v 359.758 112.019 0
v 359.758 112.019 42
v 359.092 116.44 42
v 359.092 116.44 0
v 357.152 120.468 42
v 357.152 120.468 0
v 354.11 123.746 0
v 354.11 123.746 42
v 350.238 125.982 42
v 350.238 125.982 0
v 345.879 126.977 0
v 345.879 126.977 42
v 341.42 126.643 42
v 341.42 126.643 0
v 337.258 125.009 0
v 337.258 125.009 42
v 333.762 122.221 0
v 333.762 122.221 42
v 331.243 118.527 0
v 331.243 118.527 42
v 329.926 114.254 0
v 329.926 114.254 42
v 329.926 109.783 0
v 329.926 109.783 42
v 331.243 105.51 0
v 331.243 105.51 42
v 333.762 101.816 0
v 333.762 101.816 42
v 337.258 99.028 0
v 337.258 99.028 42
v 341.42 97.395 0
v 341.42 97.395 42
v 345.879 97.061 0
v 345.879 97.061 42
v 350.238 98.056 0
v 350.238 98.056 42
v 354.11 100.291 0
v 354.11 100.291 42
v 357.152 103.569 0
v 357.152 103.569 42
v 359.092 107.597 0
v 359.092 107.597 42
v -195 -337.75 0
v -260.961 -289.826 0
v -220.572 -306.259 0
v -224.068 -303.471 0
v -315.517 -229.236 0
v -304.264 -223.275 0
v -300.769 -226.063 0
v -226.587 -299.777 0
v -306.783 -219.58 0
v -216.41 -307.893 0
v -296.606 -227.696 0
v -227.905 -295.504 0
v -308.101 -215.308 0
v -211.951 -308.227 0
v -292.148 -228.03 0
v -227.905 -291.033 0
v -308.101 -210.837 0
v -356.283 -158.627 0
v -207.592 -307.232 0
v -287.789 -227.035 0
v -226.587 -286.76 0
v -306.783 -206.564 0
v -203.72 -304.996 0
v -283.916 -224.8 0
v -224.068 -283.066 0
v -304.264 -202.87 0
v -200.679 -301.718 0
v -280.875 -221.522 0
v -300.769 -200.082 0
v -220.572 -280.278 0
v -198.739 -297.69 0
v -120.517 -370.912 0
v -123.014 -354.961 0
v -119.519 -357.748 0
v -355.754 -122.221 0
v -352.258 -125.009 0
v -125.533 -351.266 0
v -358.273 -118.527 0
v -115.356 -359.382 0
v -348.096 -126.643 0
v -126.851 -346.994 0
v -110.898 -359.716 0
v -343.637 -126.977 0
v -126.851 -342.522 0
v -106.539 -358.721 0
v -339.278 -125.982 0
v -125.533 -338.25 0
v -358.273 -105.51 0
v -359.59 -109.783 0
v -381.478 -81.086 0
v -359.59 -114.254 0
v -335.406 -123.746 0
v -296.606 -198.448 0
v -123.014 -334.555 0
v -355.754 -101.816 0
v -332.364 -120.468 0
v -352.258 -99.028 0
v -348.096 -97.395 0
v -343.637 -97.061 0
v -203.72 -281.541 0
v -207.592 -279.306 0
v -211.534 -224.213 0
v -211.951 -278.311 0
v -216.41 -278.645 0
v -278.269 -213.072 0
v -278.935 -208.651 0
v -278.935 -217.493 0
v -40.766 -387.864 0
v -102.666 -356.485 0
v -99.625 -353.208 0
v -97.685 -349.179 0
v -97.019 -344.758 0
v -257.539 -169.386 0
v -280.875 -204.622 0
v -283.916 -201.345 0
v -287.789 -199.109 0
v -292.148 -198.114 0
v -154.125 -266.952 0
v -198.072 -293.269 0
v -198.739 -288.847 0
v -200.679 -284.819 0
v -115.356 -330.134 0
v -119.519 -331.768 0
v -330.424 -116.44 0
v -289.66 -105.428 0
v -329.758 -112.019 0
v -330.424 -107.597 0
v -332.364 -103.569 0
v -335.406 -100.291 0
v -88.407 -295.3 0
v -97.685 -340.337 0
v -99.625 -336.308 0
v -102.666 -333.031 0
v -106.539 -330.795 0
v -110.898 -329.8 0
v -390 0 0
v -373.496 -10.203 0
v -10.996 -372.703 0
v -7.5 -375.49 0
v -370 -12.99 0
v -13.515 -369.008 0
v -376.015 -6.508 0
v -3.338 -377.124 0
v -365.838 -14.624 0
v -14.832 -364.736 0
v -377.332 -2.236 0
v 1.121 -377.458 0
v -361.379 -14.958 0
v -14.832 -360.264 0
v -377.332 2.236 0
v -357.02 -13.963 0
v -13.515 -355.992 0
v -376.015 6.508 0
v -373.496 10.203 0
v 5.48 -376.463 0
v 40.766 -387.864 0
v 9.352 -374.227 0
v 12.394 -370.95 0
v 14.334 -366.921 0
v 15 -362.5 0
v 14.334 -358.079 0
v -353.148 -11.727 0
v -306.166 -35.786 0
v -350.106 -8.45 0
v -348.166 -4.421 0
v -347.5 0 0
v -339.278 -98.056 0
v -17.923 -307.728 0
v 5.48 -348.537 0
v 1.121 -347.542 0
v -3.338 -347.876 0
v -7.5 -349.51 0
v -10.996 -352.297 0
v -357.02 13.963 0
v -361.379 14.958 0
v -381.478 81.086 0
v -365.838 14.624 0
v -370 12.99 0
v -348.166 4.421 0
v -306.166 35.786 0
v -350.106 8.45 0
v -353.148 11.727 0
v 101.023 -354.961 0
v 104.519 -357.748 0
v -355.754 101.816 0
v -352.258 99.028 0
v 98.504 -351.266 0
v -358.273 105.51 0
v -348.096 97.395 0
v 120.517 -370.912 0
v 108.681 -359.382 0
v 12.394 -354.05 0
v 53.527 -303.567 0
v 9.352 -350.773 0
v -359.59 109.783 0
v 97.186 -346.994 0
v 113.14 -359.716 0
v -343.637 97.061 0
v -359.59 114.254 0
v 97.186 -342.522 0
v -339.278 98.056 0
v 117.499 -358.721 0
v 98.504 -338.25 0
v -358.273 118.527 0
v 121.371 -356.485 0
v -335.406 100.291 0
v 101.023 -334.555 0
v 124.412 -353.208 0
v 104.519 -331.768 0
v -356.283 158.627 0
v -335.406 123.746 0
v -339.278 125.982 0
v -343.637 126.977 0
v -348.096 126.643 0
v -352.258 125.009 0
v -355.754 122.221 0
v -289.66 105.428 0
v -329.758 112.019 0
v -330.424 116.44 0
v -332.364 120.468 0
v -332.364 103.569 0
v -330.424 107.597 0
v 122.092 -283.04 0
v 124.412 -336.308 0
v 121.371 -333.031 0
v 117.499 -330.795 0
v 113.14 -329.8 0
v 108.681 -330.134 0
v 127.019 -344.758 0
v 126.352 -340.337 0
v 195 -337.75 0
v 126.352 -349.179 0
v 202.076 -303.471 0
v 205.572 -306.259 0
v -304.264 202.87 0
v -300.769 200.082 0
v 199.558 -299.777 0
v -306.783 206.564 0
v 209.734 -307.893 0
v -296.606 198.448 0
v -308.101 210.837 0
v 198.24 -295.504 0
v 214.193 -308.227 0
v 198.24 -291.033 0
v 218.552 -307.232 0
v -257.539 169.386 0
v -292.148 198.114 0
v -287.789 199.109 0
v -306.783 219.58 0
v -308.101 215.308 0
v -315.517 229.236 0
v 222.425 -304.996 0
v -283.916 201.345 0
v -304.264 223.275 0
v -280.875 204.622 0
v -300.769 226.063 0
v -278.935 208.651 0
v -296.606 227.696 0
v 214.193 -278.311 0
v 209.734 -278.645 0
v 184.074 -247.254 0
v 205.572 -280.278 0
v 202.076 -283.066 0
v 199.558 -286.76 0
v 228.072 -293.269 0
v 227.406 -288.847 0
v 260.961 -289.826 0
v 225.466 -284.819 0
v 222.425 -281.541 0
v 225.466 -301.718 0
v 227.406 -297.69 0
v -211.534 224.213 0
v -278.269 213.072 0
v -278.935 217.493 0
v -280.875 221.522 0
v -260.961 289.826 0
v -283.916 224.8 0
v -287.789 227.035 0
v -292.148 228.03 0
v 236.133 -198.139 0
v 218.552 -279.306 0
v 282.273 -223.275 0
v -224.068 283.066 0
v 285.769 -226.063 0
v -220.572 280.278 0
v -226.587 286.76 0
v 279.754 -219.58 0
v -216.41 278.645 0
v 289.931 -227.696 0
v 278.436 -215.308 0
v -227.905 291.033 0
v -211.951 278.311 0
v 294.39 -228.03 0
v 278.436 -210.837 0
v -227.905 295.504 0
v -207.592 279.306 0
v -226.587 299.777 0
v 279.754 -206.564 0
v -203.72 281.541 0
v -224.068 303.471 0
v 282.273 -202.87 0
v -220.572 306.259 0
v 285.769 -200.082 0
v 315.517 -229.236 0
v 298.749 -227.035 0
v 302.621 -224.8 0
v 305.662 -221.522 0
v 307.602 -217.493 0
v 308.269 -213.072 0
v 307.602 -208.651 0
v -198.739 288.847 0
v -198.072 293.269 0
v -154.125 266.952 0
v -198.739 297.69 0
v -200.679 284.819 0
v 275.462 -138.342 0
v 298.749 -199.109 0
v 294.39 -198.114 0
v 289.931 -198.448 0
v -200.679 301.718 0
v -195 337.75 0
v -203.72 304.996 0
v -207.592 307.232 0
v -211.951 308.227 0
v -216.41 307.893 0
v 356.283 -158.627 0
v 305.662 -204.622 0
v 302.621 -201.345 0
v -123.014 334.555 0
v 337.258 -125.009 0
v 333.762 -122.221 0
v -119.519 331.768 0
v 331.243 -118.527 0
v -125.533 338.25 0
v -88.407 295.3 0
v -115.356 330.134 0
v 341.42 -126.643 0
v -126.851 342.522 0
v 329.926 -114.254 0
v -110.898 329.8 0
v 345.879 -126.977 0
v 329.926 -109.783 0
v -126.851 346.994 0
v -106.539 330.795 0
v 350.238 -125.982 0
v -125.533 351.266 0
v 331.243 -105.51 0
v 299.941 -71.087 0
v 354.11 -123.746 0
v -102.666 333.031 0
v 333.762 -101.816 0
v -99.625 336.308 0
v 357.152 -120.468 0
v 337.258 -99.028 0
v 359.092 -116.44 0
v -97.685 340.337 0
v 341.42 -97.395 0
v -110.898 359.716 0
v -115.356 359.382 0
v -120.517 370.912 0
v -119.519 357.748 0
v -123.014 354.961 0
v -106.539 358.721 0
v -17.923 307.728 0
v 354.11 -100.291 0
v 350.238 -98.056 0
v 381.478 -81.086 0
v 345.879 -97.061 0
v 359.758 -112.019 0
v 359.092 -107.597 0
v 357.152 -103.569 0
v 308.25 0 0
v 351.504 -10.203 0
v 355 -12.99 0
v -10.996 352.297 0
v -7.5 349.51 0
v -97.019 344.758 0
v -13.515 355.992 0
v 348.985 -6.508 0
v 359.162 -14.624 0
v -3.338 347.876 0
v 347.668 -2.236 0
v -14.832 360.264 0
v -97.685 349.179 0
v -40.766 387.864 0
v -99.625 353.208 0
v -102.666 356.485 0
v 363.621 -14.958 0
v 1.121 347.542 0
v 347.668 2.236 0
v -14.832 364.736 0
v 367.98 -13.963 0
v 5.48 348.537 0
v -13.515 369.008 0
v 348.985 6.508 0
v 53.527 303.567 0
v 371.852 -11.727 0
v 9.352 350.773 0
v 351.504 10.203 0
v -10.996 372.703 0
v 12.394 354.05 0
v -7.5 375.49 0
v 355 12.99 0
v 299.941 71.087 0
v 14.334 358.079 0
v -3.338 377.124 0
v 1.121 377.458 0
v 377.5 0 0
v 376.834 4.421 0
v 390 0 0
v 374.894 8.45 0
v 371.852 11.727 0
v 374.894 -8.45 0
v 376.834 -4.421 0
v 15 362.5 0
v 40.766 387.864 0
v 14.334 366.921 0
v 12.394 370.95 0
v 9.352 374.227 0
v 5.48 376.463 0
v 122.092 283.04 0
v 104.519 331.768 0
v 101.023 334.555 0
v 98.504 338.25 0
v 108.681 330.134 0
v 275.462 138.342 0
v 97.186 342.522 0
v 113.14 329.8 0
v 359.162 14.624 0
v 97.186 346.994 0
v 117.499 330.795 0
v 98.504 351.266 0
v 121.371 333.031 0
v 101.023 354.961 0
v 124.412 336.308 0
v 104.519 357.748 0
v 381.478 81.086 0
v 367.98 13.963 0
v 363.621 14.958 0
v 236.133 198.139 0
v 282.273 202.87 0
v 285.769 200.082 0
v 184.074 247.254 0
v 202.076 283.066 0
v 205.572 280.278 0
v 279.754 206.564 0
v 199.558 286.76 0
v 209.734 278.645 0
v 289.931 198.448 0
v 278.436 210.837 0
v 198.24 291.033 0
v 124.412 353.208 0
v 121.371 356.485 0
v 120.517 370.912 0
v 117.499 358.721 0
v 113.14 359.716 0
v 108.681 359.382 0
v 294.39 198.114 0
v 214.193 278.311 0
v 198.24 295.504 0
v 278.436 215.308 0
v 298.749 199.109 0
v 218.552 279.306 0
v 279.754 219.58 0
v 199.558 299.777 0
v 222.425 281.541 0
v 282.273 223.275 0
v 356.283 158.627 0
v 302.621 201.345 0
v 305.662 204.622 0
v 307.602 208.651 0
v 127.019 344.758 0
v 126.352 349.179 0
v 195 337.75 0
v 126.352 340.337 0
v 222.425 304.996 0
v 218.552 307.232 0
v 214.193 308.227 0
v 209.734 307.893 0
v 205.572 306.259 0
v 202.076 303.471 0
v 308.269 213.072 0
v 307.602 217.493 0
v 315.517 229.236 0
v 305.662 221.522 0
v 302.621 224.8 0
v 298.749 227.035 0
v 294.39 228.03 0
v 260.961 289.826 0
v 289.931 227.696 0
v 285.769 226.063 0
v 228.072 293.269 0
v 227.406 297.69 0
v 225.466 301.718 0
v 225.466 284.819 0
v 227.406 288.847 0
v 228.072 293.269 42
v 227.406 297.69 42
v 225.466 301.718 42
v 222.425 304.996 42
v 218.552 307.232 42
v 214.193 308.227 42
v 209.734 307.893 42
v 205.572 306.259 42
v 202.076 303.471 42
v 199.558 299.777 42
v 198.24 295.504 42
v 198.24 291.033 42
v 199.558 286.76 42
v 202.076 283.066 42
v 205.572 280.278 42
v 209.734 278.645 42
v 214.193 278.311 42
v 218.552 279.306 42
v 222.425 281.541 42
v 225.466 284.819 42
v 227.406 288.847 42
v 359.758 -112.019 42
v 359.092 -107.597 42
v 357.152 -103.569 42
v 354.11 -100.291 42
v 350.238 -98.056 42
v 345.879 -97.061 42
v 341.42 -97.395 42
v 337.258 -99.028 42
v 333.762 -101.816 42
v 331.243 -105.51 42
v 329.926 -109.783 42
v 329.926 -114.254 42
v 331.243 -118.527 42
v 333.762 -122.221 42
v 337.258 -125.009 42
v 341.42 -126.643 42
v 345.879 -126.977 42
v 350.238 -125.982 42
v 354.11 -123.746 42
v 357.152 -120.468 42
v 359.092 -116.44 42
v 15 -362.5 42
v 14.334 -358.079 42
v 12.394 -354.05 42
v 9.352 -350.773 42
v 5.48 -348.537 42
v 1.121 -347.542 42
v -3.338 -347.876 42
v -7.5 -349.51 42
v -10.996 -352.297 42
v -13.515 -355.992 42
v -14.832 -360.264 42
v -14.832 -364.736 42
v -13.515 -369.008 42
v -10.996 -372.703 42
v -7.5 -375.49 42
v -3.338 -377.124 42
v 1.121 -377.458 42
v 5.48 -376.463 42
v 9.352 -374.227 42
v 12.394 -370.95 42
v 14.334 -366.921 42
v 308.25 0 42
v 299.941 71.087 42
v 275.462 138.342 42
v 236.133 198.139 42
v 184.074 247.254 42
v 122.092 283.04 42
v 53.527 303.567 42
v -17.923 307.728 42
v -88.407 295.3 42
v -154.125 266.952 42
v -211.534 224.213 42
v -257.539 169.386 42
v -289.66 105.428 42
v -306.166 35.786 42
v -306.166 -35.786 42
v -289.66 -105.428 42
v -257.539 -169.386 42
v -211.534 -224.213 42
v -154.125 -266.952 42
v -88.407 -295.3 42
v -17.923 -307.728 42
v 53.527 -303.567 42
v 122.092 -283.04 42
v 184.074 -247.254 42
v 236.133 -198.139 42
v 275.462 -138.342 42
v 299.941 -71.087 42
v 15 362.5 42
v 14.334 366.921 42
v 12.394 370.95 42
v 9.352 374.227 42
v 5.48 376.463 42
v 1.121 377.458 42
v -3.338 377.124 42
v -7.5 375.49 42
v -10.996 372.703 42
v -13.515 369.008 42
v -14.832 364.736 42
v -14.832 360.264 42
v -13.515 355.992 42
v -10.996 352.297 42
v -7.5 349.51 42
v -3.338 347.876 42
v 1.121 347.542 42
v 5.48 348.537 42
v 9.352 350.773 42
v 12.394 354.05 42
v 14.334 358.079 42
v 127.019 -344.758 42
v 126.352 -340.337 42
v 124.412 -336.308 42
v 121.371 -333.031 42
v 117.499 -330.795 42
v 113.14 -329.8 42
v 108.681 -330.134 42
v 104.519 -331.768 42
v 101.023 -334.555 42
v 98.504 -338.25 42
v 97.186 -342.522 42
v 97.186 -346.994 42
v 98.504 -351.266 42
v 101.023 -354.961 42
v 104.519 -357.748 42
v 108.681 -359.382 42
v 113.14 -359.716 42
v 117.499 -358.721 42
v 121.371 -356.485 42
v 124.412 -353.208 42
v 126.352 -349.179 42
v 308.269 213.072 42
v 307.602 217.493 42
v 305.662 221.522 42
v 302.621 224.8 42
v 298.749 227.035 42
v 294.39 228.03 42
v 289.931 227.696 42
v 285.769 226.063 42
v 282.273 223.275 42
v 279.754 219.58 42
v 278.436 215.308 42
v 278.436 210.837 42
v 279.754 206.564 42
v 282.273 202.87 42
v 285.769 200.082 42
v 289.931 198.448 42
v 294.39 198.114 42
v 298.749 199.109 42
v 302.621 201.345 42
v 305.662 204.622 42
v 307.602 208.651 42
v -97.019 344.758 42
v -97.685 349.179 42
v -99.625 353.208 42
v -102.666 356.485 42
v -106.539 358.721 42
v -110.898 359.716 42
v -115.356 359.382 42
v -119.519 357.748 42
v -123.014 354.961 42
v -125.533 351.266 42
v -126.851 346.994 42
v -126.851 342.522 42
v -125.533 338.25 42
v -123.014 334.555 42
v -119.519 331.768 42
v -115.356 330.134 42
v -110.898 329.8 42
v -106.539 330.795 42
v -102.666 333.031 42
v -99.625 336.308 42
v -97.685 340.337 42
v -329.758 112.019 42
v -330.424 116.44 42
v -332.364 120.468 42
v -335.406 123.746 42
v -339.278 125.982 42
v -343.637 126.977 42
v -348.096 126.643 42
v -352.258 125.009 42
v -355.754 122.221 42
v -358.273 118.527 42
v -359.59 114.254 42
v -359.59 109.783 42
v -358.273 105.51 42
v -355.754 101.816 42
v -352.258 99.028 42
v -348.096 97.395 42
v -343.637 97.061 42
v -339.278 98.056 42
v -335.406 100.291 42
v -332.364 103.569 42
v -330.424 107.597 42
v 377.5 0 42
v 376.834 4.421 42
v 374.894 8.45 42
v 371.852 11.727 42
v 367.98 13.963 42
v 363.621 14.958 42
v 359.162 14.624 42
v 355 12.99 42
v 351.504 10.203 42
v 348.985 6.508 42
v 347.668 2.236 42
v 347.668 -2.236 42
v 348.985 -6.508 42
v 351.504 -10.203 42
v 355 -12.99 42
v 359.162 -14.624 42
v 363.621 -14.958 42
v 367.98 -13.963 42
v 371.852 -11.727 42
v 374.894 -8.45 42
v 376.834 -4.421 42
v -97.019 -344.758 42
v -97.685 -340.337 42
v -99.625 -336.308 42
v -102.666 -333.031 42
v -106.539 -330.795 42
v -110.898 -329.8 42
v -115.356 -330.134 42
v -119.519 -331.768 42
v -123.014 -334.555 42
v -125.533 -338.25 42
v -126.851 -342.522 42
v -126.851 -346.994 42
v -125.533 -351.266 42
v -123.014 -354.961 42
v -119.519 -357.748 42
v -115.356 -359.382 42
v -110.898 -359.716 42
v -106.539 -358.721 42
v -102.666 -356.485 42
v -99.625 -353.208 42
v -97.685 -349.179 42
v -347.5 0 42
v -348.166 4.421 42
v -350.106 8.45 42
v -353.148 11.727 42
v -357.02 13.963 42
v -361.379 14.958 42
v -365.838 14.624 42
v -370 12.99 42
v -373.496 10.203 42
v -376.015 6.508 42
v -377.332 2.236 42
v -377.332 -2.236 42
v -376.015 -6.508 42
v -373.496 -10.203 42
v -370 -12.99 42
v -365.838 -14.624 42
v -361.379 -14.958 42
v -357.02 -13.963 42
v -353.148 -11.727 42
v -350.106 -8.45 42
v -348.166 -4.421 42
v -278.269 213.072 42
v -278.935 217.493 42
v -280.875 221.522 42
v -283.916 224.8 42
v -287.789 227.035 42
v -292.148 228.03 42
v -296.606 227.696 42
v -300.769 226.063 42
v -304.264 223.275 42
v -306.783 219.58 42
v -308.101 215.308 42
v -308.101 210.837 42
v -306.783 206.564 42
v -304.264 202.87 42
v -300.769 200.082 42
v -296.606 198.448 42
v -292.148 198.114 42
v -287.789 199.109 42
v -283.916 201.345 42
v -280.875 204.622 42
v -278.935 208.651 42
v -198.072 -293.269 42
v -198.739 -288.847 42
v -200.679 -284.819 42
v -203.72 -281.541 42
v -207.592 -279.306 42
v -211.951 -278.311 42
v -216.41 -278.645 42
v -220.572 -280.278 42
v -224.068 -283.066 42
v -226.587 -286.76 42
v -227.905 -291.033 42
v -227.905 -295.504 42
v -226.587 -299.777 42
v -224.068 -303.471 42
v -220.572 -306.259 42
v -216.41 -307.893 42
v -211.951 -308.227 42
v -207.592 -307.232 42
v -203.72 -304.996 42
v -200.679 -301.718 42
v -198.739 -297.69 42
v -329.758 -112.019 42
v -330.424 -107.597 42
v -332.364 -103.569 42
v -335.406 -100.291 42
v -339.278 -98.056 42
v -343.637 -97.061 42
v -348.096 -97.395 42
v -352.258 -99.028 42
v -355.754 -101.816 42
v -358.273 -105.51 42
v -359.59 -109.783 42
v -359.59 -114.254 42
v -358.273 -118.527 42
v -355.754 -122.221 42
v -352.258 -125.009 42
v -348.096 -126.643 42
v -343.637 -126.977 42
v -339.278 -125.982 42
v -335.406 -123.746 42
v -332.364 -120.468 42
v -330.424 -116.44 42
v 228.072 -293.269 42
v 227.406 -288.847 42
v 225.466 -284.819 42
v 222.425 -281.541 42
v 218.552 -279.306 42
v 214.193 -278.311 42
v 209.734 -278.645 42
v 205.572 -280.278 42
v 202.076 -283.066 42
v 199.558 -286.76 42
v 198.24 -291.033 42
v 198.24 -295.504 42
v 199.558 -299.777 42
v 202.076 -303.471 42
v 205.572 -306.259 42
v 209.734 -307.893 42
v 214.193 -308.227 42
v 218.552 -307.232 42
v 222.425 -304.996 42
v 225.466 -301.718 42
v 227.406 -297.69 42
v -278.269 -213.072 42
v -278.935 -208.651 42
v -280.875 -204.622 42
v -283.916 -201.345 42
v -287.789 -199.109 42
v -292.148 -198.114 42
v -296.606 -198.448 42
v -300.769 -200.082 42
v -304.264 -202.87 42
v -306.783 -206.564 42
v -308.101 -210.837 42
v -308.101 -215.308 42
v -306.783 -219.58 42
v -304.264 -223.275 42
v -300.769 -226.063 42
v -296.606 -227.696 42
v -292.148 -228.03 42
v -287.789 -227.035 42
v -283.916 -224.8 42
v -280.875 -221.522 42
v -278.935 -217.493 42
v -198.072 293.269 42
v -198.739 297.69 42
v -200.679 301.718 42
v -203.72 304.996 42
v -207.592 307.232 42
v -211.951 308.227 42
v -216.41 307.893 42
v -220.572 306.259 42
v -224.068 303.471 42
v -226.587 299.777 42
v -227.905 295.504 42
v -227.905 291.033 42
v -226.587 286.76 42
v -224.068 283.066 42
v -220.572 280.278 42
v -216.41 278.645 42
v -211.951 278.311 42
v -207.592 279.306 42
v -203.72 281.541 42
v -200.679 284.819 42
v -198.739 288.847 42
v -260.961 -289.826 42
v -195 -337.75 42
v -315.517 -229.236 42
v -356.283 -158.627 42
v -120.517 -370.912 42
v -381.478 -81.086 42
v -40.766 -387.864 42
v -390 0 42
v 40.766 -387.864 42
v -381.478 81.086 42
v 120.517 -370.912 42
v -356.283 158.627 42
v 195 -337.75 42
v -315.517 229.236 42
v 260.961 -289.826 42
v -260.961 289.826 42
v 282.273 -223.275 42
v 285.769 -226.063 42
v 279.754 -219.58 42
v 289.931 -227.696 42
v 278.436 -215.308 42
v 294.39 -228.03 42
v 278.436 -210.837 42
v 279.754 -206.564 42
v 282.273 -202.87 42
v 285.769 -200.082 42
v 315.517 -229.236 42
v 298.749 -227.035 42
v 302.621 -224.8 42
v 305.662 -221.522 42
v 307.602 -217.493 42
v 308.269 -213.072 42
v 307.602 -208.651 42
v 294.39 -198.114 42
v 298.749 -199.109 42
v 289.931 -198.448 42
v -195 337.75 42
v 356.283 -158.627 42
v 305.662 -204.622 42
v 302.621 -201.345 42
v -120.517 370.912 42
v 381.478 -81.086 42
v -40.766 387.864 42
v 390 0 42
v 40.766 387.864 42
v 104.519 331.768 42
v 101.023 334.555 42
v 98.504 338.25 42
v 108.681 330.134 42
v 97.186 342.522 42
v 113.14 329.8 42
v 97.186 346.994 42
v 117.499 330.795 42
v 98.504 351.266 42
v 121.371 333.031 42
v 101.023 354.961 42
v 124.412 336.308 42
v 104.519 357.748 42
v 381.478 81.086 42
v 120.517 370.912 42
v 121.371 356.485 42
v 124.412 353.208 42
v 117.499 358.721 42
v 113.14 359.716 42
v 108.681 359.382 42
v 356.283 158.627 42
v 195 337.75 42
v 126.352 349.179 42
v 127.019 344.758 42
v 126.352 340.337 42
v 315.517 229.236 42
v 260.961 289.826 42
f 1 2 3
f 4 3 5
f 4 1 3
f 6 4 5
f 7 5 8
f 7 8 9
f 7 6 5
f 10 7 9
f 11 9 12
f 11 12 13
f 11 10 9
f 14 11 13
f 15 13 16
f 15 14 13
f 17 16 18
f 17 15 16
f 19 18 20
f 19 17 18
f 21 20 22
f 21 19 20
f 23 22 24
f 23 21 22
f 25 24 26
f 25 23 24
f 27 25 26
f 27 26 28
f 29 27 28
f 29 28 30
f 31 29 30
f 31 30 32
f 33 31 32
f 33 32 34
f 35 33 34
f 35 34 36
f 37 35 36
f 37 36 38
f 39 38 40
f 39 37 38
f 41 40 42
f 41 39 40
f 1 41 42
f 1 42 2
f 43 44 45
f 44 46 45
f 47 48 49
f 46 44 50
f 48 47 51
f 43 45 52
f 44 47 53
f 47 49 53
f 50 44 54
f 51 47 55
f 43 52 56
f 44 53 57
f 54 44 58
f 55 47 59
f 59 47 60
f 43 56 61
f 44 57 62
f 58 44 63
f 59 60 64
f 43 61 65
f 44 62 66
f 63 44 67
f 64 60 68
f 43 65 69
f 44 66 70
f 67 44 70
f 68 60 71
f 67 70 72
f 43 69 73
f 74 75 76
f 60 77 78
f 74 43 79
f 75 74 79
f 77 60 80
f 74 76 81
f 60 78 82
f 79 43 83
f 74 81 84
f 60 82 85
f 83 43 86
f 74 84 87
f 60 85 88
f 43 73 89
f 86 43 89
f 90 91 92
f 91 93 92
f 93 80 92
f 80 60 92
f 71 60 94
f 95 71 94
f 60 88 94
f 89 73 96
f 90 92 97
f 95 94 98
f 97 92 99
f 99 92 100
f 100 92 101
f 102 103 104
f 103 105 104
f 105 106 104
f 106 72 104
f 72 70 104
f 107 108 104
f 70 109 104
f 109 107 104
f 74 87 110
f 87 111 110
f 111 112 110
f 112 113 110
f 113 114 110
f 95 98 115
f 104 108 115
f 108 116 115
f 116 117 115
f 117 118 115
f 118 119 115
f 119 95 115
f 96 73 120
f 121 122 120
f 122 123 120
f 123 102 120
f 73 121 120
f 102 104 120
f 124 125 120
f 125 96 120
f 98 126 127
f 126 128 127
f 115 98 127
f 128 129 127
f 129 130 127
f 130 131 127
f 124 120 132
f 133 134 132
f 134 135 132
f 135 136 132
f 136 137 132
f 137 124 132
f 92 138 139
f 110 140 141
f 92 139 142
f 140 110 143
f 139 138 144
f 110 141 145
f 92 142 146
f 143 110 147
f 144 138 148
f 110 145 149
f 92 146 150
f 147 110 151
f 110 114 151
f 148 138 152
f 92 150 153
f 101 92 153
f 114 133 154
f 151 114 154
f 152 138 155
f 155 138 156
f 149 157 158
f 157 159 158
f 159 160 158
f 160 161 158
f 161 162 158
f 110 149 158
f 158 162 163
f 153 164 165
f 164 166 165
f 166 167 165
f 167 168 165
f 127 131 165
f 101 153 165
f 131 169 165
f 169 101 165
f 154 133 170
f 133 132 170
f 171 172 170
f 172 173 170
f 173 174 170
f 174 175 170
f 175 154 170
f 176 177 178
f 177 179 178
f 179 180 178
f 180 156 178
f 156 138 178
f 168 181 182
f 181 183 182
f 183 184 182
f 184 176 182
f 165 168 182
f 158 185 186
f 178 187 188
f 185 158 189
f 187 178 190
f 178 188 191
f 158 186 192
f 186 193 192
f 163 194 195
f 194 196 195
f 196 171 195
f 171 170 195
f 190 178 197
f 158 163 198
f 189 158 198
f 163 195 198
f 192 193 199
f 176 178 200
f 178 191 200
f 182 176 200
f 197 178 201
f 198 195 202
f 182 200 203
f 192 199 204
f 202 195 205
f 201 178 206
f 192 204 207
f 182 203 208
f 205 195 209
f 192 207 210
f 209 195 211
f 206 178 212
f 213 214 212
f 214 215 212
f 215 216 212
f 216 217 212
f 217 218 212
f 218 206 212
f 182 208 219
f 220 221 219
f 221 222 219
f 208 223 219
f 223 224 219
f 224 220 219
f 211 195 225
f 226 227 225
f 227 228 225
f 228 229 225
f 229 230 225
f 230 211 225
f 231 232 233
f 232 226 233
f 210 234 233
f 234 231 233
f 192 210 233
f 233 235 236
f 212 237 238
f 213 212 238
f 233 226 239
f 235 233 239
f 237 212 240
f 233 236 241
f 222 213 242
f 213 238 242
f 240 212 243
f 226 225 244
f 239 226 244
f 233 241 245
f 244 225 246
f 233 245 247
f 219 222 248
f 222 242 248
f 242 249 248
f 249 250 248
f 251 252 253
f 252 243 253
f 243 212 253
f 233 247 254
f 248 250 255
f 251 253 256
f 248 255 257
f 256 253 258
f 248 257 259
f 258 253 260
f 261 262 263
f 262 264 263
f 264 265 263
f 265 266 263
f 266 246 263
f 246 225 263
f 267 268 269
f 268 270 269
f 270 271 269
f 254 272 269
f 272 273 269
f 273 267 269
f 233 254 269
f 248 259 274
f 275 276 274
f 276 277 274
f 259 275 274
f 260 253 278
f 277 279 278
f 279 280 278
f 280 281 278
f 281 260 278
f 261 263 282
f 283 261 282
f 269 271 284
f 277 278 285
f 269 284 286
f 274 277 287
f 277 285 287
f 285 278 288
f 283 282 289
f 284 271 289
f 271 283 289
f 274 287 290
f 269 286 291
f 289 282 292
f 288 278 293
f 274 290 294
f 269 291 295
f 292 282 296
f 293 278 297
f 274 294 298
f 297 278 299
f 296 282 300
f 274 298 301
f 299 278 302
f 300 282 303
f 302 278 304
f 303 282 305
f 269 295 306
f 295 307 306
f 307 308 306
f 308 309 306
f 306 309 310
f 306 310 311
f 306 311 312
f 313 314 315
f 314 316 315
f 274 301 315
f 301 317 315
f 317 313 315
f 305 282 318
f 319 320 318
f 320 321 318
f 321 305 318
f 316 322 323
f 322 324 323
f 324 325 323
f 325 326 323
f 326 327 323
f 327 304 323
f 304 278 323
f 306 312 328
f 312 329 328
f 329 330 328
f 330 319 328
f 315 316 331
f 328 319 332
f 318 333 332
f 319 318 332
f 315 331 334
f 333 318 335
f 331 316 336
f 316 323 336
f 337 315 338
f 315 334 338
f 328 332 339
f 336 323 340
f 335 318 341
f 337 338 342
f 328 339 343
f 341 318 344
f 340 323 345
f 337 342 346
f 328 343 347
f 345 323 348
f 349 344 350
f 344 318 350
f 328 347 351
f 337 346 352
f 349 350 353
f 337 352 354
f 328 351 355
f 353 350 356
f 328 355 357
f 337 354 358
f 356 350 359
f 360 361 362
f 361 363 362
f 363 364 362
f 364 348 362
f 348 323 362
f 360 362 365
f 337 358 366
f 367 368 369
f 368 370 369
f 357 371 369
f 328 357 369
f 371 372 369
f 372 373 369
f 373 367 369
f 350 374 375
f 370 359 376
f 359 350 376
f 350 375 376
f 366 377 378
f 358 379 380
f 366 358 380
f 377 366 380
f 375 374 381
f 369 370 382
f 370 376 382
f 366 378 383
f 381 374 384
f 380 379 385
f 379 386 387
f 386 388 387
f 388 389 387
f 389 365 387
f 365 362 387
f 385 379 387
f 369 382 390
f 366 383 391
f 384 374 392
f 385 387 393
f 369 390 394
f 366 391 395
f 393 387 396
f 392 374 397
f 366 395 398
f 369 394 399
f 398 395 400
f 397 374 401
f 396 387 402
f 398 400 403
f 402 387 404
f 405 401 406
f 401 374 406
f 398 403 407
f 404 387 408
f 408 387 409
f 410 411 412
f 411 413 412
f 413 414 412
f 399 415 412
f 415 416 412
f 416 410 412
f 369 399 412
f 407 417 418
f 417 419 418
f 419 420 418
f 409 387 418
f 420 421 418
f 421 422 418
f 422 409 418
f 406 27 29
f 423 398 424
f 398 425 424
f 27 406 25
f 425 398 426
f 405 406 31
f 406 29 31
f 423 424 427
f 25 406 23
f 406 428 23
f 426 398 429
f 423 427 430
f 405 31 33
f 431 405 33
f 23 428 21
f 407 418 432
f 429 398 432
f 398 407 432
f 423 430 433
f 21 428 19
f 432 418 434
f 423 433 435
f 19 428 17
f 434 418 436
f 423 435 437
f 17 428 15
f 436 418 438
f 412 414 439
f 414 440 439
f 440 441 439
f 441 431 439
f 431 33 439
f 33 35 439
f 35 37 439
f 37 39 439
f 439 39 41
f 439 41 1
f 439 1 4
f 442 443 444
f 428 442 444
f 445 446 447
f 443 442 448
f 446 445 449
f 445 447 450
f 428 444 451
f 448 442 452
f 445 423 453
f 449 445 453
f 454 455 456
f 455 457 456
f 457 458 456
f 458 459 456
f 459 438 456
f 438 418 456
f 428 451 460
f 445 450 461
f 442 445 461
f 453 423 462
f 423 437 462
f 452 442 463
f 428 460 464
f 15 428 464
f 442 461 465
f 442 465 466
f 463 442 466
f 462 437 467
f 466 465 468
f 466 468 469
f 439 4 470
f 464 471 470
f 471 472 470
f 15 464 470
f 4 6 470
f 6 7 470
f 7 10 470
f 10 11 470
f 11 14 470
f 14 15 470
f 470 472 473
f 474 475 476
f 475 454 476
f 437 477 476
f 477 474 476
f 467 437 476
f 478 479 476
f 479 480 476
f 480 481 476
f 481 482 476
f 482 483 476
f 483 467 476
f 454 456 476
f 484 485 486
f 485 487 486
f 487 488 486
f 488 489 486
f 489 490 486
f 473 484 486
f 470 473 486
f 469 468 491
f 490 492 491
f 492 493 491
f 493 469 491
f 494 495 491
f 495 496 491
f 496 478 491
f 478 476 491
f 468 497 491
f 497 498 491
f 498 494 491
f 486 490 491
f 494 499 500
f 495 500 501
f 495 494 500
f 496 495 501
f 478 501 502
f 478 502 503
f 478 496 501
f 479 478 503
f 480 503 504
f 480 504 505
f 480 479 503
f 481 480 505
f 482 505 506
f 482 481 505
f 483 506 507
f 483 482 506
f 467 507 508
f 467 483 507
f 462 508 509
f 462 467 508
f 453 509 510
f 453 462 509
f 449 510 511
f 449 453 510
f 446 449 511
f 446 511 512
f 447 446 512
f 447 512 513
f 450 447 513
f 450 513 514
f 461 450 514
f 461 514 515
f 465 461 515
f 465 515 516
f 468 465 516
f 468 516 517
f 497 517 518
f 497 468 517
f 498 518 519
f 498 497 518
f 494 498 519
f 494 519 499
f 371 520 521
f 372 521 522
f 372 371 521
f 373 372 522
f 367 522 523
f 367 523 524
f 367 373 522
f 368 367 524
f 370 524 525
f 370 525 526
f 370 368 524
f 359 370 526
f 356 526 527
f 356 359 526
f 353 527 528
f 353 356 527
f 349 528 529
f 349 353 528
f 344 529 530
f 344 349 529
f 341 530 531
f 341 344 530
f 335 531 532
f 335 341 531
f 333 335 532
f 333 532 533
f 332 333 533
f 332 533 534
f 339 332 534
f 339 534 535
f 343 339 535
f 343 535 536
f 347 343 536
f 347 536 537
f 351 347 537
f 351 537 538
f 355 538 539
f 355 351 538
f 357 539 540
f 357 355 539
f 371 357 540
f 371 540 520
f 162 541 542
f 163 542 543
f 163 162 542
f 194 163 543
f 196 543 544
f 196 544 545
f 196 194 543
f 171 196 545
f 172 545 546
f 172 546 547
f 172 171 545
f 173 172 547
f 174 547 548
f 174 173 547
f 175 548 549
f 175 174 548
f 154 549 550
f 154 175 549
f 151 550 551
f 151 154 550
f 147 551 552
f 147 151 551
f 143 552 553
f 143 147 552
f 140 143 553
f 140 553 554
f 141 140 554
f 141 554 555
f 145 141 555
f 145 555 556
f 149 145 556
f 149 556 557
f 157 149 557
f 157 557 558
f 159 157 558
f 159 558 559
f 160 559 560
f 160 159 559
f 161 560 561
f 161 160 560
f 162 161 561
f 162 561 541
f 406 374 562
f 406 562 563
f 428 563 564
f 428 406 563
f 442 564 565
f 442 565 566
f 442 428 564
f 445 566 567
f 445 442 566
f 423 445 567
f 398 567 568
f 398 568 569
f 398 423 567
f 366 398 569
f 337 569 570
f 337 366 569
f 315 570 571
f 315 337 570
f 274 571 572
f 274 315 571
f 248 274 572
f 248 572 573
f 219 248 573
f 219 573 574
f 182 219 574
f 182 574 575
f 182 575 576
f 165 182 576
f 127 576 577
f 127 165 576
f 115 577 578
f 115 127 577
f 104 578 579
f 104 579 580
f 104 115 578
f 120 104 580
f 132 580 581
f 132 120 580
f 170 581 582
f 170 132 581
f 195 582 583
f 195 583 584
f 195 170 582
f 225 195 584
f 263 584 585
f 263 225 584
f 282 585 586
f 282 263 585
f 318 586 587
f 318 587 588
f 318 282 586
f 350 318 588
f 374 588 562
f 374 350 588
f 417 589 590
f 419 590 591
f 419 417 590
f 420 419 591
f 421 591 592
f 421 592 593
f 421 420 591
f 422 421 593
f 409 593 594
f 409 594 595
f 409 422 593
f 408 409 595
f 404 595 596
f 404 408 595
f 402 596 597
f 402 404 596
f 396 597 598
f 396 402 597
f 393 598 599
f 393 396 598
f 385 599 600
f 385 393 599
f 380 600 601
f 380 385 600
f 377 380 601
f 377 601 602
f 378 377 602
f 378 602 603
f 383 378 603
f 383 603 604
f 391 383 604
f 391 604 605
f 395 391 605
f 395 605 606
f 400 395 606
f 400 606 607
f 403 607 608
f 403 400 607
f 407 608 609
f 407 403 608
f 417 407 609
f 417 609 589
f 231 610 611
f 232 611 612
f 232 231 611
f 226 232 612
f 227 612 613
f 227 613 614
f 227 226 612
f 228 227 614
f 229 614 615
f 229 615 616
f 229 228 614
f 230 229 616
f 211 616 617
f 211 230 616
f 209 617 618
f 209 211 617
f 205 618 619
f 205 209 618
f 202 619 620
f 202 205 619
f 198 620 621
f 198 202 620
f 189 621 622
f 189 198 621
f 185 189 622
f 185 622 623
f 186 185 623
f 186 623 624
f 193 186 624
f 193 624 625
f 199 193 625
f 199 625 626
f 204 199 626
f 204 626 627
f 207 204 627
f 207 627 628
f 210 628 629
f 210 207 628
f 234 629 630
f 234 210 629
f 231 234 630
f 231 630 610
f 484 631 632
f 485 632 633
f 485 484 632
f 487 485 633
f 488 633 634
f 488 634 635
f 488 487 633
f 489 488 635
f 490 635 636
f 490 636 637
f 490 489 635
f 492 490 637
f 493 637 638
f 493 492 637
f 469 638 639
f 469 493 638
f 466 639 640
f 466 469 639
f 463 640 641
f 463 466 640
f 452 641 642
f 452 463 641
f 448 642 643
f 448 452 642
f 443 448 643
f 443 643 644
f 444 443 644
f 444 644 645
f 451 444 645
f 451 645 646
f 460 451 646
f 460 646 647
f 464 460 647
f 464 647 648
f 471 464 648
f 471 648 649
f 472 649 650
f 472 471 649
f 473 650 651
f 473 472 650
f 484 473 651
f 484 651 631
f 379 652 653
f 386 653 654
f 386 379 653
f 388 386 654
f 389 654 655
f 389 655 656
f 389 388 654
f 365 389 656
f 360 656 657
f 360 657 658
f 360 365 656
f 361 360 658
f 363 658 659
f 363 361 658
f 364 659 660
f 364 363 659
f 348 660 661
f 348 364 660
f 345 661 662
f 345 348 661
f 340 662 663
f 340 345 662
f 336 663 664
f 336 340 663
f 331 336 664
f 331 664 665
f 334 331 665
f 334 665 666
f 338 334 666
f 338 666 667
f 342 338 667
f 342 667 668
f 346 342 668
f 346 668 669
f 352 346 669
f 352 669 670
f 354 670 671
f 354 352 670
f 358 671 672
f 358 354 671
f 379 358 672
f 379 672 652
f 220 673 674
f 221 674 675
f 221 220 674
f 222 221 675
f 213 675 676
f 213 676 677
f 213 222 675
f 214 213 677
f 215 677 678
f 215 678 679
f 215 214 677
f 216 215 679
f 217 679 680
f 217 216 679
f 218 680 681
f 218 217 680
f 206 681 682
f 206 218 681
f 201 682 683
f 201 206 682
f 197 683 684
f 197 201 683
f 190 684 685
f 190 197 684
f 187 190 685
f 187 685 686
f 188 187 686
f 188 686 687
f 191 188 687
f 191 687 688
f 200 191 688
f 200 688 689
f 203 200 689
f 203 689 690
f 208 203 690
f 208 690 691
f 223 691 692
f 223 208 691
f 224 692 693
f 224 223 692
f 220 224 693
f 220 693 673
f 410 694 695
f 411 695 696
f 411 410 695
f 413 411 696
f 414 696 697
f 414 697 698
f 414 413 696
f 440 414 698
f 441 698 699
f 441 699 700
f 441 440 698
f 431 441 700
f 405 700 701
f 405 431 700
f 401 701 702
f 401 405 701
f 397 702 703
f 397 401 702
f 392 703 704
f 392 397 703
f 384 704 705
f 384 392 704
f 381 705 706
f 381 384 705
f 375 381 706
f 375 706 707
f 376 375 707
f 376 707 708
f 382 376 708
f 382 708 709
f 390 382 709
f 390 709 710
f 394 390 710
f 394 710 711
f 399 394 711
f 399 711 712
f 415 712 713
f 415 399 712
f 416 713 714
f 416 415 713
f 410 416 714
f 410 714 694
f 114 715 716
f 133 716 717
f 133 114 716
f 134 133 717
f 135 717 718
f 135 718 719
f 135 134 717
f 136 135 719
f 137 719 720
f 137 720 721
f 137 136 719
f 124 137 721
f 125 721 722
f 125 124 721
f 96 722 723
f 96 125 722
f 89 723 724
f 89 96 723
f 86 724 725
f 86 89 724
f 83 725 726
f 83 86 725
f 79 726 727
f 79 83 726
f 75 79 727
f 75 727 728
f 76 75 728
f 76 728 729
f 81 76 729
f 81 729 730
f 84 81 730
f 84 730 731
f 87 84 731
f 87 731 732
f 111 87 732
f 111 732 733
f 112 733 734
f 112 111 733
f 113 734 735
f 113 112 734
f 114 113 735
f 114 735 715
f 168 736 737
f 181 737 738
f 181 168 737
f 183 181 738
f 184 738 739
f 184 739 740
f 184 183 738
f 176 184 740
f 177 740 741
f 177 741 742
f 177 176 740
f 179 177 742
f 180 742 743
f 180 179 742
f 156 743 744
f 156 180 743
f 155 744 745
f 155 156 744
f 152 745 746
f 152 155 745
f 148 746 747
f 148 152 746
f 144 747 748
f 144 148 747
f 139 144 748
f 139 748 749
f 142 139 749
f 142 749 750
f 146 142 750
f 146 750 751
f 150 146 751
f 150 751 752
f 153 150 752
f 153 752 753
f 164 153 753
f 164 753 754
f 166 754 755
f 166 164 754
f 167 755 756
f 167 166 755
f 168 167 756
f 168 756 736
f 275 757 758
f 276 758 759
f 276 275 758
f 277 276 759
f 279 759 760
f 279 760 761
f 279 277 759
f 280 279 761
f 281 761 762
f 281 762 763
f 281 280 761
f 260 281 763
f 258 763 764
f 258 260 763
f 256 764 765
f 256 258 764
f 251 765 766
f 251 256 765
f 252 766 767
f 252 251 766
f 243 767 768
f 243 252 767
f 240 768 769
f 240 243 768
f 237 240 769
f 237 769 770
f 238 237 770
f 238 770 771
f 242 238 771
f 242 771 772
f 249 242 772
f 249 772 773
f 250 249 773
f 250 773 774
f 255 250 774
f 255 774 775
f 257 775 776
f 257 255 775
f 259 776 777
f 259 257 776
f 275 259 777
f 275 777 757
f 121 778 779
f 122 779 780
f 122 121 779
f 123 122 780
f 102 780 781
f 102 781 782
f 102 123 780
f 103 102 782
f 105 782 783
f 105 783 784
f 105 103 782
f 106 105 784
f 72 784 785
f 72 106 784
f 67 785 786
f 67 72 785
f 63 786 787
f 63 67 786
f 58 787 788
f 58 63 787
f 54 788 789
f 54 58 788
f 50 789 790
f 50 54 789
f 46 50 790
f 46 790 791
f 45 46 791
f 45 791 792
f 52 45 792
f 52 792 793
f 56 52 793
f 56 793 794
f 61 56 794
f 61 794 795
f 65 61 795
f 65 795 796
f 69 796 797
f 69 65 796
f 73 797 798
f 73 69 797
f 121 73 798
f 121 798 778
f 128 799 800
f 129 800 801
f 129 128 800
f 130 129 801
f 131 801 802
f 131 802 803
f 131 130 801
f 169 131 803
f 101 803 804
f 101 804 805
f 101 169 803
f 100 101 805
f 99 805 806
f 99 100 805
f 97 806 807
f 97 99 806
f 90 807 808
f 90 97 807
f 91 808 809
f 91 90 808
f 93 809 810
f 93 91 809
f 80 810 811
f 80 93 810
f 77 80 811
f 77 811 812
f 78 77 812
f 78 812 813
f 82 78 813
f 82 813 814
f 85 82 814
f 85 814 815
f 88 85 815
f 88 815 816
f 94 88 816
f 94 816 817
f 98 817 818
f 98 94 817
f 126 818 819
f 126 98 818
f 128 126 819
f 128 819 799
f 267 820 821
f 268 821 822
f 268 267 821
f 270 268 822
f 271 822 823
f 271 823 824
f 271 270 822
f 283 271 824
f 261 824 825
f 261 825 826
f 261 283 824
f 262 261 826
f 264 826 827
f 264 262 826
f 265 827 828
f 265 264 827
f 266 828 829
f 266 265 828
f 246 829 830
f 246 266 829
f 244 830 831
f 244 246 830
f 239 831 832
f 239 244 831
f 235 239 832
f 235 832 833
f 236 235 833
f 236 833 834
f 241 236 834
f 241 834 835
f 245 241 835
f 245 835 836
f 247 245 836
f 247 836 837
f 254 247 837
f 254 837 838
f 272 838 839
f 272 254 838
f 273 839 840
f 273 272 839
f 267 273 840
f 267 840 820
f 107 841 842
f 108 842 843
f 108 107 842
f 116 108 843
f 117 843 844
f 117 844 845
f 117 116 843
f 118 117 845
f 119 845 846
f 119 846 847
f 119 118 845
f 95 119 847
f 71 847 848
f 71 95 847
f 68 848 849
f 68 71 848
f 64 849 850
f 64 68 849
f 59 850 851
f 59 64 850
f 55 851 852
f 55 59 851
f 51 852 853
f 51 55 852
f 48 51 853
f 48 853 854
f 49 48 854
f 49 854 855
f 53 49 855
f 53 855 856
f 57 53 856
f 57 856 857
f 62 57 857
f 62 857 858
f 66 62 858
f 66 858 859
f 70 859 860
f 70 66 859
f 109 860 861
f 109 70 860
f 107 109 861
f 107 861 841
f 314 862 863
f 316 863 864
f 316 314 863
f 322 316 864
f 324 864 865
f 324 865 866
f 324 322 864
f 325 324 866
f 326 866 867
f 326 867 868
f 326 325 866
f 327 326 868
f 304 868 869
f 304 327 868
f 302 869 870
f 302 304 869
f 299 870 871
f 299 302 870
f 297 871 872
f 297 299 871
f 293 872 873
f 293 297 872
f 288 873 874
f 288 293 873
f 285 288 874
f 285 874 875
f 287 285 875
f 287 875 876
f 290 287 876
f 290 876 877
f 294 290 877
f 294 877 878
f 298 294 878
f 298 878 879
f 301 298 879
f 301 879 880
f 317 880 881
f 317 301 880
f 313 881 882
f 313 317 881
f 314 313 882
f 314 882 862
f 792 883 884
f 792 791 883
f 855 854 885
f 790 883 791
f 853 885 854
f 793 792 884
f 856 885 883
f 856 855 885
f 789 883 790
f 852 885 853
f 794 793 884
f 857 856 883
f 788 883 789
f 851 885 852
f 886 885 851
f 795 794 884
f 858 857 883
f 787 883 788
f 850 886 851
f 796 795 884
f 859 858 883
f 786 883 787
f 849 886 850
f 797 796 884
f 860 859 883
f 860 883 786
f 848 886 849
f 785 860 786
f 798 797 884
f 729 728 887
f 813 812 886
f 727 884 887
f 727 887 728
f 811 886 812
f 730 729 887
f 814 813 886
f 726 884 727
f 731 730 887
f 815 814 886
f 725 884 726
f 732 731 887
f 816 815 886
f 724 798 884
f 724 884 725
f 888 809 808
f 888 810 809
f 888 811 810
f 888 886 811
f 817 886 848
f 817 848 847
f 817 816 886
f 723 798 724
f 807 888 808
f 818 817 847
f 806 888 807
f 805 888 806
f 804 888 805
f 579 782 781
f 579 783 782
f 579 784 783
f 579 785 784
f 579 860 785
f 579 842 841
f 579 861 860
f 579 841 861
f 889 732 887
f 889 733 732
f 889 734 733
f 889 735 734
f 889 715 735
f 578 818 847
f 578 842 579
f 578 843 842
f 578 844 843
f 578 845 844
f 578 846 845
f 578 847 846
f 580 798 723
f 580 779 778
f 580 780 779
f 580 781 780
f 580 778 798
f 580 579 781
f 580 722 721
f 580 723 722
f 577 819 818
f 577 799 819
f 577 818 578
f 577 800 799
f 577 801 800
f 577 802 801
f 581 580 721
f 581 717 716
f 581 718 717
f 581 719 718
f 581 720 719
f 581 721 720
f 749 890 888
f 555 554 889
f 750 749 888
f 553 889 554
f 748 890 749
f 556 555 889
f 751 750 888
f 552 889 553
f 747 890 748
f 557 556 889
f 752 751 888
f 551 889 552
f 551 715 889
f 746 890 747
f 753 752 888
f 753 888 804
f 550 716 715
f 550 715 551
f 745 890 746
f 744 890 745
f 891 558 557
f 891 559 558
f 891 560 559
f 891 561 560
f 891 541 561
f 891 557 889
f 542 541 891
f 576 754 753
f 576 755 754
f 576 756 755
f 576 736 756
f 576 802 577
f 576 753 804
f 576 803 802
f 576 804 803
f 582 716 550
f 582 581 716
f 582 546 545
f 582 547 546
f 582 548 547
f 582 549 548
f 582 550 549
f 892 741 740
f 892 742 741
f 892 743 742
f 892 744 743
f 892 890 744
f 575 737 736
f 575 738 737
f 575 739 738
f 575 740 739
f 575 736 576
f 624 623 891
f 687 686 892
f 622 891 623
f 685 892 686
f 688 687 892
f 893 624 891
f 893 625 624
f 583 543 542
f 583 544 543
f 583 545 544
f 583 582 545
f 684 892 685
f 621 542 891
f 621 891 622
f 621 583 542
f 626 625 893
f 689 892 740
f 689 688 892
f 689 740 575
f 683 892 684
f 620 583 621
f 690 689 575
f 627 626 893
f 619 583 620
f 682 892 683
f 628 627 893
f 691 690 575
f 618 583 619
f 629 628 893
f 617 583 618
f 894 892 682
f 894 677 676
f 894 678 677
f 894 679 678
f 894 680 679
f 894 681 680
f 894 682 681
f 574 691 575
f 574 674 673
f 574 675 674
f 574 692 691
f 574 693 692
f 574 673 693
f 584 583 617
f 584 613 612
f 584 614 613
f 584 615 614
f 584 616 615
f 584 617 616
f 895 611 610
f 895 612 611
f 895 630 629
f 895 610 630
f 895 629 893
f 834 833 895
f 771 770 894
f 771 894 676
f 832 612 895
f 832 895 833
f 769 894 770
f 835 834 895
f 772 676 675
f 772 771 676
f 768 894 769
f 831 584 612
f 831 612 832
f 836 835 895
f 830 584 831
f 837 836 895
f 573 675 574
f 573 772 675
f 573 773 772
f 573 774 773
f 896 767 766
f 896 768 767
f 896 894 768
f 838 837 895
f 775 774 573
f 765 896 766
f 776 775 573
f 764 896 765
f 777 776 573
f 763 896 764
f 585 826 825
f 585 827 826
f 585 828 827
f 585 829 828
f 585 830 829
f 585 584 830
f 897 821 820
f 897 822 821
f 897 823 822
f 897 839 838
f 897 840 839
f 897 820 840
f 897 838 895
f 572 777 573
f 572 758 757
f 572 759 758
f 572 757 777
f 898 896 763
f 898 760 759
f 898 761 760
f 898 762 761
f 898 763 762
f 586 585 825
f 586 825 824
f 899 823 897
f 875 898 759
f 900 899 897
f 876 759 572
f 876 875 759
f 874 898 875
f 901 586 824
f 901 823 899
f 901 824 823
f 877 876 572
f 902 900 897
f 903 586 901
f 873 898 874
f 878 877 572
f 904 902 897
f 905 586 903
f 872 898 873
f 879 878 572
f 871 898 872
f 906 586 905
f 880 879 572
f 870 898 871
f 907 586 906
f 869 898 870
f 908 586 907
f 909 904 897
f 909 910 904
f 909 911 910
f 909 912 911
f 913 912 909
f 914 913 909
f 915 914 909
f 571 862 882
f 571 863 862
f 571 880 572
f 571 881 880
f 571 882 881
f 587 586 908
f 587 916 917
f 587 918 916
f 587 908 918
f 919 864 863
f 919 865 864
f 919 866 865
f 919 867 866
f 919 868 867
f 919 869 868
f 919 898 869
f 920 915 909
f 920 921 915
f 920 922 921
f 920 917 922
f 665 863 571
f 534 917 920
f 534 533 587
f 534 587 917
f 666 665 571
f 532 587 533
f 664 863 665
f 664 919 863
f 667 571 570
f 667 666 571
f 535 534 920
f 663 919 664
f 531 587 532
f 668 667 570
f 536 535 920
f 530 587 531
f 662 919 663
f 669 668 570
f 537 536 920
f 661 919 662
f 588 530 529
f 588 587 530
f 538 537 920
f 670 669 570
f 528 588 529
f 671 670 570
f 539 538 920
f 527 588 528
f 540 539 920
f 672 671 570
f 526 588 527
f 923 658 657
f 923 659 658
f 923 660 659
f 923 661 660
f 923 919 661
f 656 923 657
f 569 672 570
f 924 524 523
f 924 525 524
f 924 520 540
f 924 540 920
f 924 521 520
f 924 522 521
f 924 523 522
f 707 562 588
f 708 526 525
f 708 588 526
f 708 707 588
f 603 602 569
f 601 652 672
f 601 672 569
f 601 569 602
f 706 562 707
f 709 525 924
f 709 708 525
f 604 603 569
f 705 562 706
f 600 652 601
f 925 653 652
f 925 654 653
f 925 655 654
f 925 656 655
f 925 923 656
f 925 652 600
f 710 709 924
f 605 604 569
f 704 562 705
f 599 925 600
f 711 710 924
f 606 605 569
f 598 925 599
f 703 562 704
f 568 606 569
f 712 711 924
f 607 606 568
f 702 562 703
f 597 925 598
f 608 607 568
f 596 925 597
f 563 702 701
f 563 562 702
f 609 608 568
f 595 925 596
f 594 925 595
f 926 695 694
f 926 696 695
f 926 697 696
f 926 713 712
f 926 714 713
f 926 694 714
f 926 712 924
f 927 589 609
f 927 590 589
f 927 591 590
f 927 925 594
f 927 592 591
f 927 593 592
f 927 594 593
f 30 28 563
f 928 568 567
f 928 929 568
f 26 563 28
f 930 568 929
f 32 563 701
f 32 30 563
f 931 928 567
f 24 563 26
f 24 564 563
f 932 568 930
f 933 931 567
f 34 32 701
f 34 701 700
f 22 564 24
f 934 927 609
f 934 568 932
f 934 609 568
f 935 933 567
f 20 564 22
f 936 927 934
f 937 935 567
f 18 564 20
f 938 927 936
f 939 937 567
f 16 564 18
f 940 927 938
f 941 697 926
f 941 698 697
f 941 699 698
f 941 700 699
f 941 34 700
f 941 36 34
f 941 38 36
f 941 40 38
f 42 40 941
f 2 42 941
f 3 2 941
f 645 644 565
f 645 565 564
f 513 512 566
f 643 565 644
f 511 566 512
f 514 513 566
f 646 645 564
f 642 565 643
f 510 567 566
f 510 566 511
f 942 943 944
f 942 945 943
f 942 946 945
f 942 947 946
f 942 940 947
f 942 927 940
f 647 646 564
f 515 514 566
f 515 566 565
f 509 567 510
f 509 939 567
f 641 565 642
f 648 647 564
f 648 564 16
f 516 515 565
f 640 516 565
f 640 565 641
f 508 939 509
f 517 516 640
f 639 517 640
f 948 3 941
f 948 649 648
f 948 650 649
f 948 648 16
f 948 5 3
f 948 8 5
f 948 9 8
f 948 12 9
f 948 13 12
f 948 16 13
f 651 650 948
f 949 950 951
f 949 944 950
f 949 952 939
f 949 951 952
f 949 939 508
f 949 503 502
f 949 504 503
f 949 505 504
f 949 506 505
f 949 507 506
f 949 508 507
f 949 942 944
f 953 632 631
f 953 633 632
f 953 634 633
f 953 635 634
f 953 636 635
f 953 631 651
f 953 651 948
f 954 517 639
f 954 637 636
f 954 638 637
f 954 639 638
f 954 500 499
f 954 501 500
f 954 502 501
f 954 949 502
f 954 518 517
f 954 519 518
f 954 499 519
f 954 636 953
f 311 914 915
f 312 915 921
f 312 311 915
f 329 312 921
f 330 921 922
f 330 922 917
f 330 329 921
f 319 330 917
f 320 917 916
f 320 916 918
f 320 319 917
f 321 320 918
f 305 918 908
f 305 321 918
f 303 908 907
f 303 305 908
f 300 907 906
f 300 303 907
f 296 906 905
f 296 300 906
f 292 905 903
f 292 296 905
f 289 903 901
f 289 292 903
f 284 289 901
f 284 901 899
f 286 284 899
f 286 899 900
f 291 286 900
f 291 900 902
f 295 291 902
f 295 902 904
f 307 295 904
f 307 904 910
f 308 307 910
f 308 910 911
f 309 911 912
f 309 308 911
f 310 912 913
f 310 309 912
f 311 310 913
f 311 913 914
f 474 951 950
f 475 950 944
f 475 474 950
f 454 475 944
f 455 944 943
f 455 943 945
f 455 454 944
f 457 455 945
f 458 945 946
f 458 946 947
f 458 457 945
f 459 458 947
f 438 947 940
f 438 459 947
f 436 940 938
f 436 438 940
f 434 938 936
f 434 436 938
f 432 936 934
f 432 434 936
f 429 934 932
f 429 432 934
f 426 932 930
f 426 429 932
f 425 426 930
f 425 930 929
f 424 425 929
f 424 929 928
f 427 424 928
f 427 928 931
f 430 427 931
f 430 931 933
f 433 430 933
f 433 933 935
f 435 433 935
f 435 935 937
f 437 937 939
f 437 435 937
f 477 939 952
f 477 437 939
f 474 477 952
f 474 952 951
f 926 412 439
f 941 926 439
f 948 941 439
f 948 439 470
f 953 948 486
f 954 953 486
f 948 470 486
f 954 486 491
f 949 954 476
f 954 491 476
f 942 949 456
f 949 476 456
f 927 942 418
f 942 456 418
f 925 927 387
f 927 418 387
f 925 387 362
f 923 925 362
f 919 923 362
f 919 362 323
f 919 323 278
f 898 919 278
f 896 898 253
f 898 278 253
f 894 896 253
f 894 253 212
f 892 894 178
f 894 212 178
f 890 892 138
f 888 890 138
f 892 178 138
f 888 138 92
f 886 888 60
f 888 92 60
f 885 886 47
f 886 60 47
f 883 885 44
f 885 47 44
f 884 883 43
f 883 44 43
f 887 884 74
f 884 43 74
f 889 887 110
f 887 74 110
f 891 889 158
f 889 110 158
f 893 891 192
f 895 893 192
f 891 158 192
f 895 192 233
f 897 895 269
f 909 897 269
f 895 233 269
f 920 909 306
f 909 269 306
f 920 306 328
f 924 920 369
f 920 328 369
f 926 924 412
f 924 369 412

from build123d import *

# Parameters (mm, degrees)
F0_R     = 390
F0_R_2   = 15
F0_R_3   = 308.25
F1_DEPTH = 42


with BuildPart() as f1:
    # F0 (on Top) → F1 (new body)
    with BuildSketch(Plane.XY):
        Circle(F0_R)
        with Locations((-213.072154, -293.26866)):
            Circle(F0_R_2, mode=Mode.SUBTRACT)
        with Locations((-293.26866, -213.072154)):
            Circle(F0_R_2, mode=Mode.SUBTRACT)
        with Locations((-112.01866, -344.757987)):
            Circle(F0_R_2, mode=Mode.SUBTRACT)
        with Locations((-344.757987, -112.01866)):
            Circle(F0_R_2, mode=Mode.SUBTRACT)
        with Locations((0, -362.5)):
            Circle(F0_R_2, mode=Mode.SUBTRACT)
        with Locations((112.01866, -344.757987)):
            Circle(F0_R_2, mode=Mode.SUBTRACT)
        with Locations((213.072154, -293.26866)):
            Circle(F0_R_2, mode=Mode.SUBTRACT)
        with Locations((293.26866, -213.072154)):
            Circle(F0_R_2, mode=Mode.SUBTRACT)
        with Locations((344.757987, -112.01866)):
            Circle(F0_R_2, mode=Mode.SUBTRACT)
        with Locations((-362.5, 0)):
            Circle(F0_R_2, mode=Mode.SUBTRACT)
        with Locations((-344.757987, 112.01866)):
            Circle(F0_R_2, mode=Mode.SUBTRACT)
        with Locations((-293.26866, 213.072154)):
            Circle(F0_R_2, mode=Mode.SUBTRACT)
        with Locations((-213.072154, 293.26866)):
            Circle(F0_R_2, mode=Mode.SUBTRACT)
        with Locations((-112.01866, 344.757987)):
            Circle(F0_R_2, mode=Mode.SUBTRACT)
        Circle(F0_R_3, mode=Mode.SUBTRACT)
        with Locations((362.5, 0)):
            Circle(F0_R_2, mode=Mode.SUBTRACT)
        with Locations((344.757987, 112.01866)):
            Circle(F0_R_2, mode=Mode.SUBTRACT)
        with Locations((0, 362.5)):
            Circle(F0_R_2, mode=Mode.SUBTRACT)
        with Locations((112.01866, 344.757987)):
            Circle(F0_R_2, mode=Mode.SUBTRACT)
        with Locations((293.26866, 213.072154)):
            Circle(F0_R_2, mode=Mode.SUBTRACT)
        with Locations((213.072154, 293.26866)):
            Circle(F0_R_2, mode=Mode.SUBTRACT)
    extrude(amount=F1_DEPTH)


solid = f1.part
